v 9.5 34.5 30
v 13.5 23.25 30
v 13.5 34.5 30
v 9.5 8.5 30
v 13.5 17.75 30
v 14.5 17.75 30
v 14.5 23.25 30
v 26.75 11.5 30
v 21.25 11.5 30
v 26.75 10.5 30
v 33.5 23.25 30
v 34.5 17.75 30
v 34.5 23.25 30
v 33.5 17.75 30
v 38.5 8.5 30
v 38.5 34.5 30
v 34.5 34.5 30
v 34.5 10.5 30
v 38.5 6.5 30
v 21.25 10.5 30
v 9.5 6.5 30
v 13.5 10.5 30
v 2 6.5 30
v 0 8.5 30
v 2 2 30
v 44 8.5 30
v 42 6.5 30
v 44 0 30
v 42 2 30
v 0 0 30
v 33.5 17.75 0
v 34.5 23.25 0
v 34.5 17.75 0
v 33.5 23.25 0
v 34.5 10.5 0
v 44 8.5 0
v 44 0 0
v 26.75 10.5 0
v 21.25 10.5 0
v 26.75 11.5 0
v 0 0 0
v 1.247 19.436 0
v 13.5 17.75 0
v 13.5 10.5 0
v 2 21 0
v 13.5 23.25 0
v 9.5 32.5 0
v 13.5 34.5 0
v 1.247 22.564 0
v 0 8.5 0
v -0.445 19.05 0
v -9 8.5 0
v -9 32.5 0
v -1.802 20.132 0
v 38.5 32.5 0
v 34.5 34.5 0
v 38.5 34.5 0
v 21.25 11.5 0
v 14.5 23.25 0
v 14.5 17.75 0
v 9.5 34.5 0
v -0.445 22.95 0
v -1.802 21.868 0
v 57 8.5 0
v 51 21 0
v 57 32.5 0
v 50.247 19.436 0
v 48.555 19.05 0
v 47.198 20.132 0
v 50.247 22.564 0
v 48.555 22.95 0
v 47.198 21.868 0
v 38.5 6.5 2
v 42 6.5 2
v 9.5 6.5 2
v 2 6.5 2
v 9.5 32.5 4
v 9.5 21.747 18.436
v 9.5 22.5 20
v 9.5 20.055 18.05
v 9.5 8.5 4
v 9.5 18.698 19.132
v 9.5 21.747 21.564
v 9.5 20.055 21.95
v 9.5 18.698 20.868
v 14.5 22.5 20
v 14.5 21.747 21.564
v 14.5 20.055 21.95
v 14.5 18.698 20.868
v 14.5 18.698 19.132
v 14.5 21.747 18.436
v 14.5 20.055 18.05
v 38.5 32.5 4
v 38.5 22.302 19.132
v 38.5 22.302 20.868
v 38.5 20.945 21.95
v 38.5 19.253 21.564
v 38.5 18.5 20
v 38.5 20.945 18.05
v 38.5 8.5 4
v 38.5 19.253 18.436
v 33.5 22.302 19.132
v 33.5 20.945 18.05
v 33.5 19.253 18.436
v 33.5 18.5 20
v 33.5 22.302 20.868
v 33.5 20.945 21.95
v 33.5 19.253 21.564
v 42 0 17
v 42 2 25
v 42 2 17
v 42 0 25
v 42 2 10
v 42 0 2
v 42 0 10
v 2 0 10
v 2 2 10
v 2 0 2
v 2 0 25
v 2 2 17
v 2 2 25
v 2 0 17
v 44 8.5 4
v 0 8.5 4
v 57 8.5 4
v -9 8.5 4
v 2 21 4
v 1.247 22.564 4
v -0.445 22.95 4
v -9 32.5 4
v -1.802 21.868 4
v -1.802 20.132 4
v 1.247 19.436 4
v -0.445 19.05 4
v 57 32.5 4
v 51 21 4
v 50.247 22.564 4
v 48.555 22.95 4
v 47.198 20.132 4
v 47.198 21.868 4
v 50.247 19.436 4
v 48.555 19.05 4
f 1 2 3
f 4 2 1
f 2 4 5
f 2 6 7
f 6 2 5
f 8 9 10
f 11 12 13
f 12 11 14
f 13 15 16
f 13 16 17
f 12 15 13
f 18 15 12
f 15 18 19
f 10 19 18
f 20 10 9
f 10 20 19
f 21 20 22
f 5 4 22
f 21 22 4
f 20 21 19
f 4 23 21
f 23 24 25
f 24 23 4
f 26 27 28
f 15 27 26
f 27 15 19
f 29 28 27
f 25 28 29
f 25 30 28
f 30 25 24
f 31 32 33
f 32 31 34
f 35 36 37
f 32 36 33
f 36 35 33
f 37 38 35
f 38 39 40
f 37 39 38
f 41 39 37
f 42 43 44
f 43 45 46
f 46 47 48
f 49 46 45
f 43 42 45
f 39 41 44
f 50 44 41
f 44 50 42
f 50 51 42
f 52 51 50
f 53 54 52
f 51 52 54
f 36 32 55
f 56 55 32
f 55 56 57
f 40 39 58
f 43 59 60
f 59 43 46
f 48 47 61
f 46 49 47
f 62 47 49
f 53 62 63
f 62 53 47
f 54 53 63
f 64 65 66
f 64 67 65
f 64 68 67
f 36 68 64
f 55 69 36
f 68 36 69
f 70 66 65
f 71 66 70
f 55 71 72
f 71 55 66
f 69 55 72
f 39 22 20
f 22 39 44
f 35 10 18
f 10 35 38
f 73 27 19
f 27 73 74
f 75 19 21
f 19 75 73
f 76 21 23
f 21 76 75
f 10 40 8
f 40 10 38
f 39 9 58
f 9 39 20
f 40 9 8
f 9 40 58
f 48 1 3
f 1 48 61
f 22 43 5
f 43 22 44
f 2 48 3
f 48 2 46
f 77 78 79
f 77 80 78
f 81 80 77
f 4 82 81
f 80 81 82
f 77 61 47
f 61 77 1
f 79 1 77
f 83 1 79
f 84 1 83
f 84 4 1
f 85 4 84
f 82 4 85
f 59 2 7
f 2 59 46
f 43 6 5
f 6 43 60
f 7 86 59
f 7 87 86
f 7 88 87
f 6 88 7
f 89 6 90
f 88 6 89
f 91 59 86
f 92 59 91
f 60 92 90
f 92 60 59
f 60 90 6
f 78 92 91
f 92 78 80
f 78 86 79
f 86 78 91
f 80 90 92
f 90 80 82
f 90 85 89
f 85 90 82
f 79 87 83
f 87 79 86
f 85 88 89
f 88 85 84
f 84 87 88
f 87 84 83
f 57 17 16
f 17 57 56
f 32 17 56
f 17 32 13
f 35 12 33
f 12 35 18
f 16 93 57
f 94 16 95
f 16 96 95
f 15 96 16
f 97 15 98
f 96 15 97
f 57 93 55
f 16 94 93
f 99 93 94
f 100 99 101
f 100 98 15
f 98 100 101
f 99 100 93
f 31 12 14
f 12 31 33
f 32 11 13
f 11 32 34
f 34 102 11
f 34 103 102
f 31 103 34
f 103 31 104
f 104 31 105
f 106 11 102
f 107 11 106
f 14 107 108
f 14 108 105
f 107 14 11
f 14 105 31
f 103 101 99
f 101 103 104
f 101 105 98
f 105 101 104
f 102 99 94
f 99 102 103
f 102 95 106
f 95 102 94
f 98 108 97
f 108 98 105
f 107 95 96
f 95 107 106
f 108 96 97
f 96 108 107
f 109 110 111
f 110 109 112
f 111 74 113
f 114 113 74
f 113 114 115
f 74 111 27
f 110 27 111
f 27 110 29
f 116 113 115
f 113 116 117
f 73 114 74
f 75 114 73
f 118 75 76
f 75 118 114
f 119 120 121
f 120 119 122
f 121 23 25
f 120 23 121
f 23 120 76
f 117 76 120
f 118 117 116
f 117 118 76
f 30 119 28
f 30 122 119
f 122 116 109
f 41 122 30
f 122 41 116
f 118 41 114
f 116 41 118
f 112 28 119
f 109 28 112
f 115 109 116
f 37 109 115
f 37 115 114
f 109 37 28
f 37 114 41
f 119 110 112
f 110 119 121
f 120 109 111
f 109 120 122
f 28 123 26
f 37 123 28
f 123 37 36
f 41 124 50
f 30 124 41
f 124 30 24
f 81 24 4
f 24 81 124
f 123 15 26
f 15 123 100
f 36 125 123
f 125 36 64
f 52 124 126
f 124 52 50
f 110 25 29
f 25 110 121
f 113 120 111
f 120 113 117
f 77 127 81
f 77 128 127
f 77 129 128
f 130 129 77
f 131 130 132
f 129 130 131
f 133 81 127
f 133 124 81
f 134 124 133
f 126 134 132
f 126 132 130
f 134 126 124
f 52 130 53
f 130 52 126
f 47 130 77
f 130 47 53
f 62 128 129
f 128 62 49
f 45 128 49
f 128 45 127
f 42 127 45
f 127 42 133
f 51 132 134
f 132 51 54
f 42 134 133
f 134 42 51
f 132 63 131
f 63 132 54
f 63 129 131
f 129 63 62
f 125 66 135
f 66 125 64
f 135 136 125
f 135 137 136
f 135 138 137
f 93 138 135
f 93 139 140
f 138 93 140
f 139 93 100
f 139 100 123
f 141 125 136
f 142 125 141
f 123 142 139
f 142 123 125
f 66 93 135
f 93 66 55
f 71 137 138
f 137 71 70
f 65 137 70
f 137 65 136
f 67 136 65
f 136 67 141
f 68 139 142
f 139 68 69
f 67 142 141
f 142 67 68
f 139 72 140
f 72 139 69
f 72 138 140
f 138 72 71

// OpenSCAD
ins_h = 30;
ins_w = 4.5;
ins_l = 40;
ins_wall = 2;

wall = 4;
attach_w = 20 + wall*2;

// bolted one
module frame_wall(has_hole=true) {
  difference() {
    union() {
      translate([-attach_w/2, 0, 0]) {
        cube([attach_w, wall, ins_h]);
        translate([attach_w/2-5.5/2, wall, 0]) {
          cube([5.5, 1, ins_h]);
        }
      }
    }
    if(has_hole) {
      translate([0, 8, ins_h/2-5]) {
        rotate([90, 0, 0])
          cylinder(d=4, h=10);
      }
    }
  }
}
module container() {
  // container
  difference() {
    cube([ins_l+ins_wall*2, ins_w+ins_wall*2, ins_h]);
    translate([ins_wall, ins_wall, ins_wall]) {
      cube([ins_l, ins_w, ins_h]);
    }
    translate([ins_wall, 0, ins_wall]) {
      cube([ins_l, ins_w, 8]);
      translate([0, 0, 15]) {
        cube([ins_l, ins_w, 8]);
      }
    }
  }
}

module frame_holder() {
  translate([ins_l/2+wall, wall+ins_w, 0]) {
    frame_wall(has_hole=false);
  }
  translate([ins_l/2-10.5,  attach_w/2+wall+ins_w, ins_h]) {
    rotate([180, 0, 90]) {
      frame_wall(has_hole=true);
    }
  }
  translate([ins_l/2+wall*2+10.5, attach_w/2+wall+ins_w, ins_h]) {
    rotate([180, 0, -90]) {
      frame_wall(has_hole=true);
    }
  }
}

translate([0, -ins_wall, 0])
  frame_holder();
container();

translate([-9, wall+ins_w, 0]) {
  difference() {
    cube([20, 20+wall, 4]);
    translate([9, 12.5, -2.5])
      cylinder(d=4, h=10);
  }
}

translate([-9+ins_l+wall*2-2, wall+ins_w, 0]) {
  difference() {
    cube([20, 20+wall, 4]);
    translate([12, 12.5, -2.5])
      cylinder(d=4, h=10);
  }
}
